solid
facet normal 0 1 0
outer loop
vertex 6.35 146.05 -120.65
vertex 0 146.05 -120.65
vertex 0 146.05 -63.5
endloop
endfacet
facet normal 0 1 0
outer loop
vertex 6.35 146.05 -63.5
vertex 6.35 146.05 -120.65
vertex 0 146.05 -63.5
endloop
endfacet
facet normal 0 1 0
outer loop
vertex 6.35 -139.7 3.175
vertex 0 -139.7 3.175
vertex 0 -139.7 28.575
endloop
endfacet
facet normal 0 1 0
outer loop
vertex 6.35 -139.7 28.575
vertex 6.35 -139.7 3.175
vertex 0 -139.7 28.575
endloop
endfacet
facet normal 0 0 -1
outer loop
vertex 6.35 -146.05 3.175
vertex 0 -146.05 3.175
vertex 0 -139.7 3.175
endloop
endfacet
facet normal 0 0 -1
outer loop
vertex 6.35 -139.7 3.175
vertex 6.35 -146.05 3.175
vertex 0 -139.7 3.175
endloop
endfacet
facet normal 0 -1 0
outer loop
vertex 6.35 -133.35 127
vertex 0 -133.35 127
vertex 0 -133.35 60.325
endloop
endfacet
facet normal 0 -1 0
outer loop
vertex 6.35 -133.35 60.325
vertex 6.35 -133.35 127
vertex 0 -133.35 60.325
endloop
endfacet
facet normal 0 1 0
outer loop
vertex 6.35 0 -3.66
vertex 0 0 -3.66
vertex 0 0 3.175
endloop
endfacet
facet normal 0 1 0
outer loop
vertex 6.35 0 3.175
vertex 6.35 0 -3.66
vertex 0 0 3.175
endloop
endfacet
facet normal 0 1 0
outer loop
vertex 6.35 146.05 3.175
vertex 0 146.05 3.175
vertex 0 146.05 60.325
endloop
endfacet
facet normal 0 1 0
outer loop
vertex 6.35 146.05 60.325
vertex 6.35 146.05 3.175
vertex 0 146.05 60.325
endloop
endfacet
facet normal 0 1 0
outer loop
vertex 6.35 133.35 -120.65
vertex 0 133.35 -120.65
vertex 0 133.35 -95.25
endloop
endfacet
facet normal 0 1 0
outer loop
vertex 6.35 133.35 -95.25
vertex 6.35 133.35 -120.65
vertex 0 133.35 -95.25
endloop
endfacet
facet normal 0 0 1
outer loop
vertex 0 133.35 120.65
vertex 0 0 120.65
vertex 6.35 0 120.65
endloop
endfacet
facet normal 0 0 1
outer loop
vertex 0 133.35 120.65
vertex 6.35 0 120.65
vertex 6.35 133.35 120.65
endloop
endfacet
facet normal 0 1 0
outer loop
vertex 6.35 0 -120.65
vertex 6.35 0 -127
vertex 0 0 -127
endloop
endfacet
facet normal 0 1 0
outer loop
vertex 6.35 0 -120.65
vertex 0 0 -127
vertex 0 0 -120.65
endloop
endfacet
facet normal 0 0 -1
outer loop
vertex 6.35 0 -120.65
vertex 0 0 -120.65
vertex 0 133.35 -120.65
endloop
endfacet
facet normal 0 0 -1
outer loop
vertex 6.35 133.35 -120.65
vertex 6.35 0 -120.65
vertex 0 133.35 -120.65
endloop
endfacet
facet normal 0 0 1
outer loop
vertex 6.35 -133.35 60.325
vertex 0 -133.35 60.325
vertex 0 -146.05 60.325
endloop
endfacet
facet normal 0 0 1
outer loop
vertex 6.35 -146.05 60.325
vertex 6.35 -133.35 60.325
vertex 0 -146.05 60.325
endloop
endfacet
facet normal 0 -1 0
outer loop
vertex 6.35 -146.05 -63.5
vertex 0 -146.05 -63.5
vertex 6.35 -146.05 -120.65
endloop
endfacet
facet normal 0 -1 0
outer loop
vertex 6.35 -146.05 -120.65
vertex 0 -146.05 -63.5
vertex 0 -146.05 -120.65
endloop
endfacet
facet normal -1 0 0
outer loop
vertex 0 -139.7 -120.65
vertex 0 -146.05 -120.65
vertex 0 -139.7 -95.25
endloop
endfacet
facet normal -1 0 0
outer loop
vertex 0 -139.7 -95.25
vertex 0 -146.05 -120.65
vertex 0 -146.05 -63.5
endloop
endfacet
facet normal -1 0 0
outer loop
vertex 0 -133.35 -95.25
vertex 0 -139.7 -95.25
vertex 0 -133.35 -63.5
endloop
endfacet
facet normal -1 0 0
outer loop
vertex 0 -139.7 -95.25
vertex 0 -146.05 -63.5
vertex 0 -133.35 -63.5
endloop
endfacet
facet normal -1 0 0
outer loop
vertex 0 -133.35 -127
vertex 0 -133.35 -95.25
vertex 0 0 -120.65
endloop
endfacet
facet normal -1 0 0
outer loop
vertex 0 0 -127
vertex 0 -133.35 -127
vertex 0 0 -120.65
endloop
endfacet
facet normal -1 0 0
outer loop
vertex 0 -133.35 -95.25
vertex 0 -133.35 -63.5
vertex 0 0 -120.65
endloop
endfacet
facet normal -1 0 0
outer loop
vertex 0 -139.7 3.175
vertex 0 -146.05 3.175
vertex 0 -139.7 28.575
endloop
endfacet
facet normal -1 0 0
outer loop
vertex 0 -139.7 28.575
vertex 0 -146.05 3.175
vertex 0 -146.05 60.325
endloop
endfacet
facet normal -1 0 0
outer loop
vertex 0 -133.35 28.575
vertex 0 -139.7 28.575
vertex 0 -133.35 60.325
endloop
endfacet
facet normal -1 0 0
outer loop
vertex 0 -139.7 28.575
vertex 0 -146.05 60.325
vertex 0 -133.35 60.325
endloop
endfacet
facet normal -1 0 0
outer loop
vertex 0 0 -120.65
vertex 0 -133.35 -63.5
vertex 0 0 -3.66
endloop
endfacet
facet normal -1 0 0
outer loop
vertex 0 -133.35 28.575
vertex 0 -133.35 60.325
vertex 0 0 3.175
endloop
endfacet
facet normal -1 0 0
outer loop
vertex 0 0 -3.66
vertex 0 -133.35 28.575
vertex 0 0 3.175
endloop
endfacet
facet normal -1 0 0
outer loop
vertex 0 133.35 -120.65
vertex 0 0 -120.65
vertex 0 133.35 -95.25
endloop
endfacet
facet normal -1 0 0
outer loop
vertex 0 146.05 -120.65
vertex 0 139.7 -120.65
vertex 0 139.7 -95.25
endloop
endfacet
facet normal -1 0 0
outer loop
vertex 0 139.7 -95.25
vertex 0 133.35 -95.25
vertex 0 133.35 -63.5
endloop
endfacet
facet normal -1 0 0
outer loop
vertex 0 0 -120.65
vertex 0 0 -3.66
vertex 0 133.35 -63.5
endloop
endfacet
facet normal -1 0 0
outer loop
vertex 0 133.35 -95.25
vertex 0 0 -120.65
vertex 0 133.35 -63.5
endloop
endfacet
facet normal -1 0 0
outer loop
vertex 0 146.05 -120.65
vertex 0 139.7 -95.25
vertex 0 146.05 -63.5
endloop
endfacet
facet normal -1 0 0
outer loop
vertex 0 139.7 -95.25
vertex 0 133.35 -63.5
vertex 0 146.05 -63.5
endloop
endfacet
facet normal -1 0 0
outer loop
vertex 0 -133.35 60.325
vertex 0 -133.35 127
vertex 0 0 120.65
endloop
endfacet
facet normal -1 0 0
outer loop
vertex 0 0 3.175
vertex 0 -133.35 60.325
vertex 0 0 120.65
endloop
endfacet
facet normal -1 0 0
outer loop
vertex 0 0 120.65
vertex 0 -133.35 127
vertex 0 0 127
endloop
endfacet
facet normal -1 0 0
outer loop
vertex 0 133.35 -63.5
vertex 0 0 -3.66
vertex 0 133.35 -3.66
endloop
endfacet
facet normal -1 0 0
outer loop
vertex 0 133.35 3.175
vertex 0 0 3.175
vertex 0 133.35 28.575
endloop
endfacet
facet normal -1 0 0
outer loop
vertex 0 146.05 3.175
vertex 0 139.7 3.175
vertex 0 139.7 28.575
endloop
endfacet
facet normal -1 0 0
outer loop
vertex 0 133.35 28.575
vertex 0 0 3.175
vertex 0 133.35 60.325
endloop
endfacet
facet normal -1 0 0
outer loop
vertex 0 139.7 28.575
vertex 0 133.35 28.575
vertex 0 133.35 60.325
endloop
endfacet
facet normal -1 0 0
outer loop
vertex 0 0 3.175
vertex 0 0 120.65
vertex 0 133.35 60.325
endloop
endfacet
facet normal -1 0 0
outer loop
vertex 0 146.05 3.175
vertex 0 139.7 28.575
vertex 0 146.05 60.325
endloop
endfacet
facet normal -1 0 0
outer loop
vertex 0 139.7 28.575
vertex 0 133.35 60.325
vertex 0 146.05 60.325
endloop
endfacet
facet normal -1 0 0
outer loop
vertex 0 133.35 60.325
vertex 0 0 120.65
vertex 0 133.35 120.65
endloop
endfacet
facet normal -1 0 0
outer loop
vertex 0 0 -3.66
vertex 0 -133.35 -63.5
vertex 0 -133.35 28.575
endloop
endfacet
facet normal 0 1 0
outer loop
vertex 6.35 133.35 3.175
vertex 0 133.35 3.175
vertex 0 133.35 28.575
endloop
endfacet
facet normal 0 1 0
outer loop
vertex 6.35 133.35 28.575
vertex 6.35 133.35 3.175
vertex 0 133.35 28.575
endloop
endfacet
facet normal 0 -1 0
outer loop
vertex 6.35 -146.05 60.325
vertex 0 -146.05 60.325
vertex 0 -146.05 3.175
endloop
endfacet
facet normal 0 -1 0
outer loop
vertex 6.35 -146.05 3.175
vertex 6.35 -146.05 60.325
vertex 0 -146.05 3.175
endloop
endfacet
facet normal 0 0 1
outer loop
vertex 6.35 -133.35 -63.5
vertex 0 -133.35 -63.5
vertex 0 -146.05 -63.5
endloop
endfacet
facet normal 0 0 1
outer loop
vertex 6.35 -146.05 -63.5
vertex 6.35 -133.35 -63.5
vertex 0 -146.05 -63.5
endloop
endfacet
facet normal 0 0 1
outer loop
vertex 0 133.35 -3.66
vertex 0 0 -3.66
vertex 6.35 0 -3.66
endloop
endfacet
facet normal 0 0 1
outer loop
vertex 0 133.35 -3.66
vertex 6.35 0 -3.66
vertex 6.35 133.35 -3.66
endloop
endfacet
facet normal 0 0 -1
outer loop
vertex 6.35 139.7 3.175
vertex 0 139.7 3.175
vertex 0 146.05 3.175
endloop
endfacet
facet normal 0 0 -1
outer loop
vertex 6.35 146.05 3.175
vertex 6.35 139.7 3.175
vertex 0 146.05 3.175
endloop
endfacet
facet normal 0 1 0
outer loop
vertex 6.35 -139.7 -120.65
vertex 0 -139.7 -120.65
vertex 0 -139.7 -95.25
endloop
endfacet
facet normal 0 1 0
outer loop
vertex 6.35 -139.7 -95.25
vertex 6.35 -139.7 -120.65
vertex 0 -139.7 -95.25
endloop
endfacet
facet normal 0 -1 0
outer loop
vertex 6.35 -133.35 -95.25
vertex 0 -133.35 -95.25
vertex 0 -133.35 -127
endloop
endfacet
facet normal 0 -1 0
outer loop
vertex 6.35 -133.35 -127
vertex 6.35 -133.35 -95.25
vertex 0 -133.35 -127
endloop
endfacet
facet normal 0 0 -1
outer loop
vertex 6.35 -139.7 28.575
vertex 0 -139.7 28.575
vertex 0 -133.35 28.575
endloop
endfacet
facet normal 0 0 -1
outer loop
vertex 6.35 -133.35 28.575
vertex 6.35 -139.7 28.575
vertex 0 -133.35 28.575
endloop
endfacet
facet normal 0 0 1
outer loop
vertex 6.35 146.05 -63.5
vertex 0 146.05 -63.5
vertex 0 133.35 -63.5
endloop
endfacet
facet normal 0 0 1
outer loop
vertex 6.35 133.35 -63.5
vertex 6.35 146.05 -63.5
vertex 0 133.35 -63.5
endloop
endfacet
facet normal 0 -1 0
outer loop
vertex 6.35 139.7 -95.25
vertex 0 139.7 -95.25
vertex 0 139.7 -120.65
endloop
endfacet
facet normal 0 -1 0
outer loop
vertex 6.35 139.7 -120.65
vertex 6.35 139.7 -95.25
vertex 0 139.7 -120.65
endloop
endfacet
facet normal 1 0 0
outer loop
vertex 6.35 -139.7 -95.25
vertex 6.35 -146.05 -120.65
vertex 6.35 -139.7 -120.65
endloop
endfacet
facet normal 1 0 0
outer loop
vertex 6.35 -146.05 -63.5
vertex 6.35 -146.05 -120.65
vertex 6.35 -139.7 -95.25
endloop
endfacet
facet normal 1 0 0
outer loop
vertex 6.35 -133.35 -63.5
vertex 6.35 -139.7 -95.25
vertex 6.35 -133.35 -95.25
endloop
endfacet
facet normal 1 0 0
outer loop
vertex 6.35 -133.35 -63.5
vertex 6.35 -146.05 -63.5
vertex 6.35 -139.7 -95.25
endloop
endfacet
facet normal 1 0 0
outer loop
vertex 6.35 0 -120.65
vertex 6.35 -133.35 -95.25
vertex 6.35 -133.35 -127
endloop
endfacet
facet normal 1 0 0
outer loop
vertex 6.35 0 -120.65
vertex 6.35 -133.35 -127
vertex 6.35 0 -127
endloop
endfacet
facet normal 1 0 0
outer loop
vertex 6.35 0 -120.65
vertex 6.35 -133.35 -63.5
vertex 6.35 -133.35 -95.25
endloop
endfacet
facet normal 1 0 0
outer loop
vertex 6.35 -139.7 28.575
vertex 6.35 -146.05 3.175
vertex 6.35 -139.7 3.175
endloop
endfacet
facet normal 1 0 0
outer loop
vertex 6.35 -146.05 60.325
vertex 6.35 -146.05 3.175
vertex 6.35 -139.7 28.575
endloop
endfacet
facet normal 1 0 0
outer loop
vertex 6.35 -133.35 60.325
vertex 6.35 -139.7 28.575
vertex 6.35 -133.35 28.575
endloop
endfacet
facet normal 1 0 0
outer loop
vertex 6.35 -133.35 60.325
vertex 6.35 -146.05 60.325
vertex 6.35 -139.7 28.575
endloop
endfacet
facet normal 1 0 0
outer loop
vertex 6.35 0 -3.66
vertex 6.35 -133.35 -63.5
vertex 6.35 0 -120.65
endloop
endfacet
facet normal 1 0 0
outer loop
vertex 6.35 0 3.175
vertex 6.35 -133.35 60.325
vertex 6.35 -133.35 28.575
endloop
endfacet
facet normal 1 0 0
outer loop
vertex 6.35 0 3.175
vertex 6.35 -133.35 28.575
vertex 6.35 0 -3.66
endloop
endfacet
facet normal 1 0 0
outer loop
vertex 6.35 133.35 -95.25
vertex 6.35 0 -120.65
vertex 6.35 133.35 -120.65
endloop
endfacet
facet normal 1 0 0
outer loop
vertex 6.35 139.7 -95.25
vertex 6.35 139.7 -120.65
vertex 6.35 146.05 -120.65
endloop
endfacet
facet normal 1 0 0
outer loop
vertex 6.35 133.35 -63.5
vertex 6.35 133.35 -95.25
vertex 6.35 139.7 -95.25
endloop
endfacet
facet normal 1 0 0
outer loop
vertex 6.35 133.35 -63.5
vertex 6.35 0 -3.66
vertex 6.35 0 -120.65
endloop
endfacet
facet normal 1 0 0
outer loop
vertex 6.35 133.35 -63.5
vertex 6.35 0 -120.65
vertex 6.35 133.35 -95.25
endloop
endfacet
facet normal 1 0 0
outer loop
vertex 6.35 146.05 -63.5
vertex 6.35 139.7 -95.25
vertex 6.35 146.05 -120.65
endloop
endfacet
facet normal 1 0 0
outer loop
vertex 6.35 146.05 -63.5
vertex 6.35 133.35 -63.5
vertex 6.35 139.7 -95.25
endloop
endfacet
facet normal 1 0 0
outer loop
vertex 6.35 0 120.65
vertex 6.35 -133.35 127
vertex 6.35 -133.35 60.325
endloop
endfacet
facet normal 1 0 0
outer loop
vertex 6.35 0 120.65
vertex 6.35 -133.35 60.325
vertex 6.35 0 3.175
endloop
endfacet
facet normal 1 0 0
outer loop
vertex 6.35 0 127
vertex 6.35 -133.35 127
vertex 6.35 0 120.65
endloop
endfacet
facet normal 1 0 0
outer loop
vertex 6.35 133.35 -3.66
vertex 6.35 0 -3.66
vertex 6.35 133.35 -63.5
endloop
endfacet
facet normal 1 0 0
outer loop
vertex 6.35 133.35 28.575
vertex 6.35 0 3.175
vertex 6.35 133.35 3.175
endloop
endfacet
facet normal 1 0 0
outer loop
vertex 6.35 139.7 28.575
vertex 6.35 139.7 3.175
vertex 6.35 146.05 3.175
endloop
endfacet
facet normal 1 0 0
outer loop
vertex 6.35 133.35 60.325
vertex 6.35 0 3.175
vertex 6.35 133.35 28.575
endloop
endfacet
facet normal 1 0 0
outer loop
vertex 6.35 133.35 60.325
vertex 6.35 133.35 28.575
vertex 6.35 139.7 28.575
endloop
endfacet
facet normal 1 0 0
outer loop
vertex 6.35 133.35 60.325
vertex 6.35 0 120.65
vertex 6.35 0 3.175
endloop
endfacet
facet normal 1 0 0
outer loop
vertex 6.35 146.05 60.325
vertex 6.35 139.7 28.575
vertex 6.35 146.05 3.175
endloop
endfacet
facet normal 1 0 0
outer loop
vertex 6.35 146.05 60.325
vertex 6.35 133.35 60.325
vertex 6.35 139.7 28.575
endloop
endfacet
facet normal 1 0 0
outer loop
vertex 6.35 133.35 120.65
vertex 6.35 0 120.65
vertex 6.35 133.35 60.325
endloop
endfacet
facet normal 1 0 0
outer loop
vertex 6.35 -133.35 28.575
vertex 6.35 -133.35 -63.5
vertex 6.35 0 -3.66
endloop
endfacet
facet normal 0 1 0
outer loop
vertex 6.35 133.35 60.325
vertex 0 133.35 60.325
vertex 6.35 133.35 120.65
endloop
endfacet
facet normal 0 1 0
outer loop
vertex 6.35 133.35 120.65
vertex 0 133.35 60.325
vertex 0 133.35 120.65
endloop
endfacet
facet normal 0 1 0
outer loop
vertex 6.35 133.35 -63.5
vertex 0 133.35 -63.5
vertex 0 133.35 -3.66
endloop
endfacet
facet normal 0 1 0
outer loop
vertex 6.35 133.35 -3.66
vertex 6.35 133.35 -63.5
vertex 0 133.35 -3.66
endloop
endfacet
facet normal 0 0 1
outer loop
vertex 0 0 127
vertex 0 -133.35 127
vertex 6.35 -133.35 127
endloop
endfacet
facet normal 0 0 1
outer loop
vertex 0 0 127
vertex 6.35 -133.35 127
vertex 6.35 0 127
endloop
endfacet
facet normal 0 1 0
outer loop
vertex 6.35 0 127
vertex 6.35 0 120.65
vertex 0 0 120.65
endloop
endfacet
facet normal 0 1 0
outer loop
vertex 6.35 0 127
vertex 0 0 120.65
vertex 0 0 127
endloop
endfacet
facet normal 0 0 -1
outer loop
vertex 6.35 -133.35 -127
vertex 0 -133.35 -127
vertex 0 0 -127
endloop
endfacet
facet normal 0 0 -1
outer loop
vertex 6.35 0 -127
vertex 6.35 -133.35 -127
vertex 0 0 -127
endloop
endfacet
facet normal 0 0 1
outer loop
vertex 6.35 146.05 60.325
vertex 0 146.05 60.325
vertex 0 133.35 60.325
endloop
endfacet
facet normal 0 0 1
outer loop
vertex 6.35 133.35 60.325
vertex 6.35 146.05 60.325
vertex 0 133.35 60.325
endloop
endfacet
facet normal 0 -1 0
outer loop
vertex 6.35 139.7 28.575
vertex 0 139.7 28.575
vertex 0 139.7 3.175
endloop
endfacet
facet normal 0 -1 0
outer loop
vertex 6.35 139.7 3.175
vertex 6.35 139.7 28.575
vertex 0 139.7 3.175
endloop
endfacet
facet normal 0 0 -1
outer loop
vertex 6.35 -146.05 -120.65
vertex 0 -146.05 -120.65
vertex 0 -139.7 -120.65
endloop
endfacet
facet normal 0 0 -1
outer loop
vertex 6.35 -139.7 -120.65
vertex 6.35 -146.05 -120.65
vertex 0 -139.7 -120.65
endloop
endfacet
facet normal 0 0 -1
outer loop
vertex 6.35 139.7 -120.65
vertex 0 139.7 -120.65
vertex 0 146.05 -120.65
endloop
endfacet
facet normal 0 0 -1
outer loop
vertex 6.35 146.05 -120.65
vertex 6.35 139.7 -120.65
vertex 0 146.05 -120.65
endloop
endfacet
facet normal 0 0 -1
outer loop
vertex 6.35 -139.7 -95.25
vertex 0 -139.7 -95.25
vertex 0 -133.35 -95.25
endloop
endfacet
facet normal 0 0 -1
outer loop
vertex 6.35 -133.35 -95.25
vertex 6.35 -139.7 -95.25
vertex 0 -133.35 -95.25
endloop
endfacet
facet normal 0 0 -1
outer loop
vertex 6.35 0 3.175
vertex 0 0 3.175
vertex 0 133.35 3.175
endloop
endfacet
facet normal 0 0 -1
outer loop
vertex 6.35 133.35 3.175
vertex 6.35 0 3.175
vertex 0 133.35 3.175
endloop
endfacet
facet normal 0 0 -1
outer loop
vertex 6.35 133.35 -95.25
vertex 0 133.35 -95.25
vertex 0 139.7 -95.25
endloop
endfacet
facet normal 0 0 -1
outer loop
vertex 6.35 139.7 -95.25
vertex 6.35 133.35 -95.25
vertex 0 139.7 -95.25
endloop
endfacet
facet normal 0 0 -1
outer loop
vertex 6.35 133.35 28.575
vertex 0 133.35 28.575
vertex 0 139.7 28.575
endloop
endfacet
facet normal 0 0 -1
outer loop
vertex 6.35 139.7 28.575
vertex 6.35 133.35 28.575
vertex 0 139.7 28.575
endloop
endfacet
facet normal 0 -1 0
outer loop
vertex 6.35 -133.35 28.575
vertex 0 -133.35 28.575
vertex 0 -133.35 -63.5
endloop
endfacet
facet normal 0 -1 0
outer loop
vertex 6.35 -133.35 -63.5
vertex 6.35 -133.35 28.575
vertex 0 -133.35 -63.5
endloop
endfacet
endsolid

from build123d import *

# Parameters (mm, degrees)
F0_W     = 133.35
F0_H     = 6.35
F0_H_2   = 60.325
F0_H_3   = 31.75
F0_W_2   = 6.35
F0_H_4   = 25.4
F0_H_5   = 6.8349212326
F0_H_6   = 59.8400787674
F1_DEPTH = 6.35


# Not quite as in the source:
# - a feature names something its author has since deleted; it is built from what else it names


with BuildPart() as f1:
    # F0 (on Right) → F1 (new body)
    with BuildSketch(Plane.YZ):
        with Locations((-66.675, 123.825)):
            Rectangle(F0_W, F0_H)
        with Locations((-66.675, 90.4875)):
            Rectangle(F0_W, F0_H_2)
        with Locations((66.675, 90.4875)):
            Rectangle(F0_W, F0_H_2)
        with Locations((-66.675, 44.45)):
            Rectangle(F0_W, F0_H_3)
        with Locations((-136.525, 44.45)):
            Rectangle(F0_W_2, F0_H_3)
        with Locations((66.675, 44.45)):
            Rectangle(F0_W, F0_H_3)
        with Locations((-66.675, 15.875)):
            Rectangle(F0_W, F0_H_4)
        with Locations((-142.875, 44.45)):
            Rectangle(F0_W_2, F0_H_3)
        with Locations((136.525, 44.45)):
            Rectangle(F0_W_2, F0_H_3)
        with Locations((66.675, 15.875)):
            Rectangle(F0_W, F0_H_4)
        with Locations((-66.675, -0.2424606163)):
            Rectangle(F0_W, F0_H_5)
        with Locations((-142.875, 15.875)):
            Rectangle(F0_W_2, F0_H_4)
        Polygon((146.05, 60.325), (139.7, 60.325), (139.7, 28.575), (139.7, 3.175), (146.05, 3.175), align=None)
        with Locations((-66.675, -33.5799606163)):
            Rectangle(F0_W, F0_H_6)
        with Locations((66.675, -33.5799606163)):
            Rectangle(F0_W, F0_H_6)
        with Locations((-66.675, -79.375)):
            Rectangle(F0_W, F0_H_3)
        with Locations((-136.525, -79.375)):
            Rectangle(F0_W_2, F0_H_3)
        with Locations((66.675, -79.375)):
            Rectangle(F0_W, F0_H_3)
        with Locations((-66.675, -107.95)):
            Rectangle(F0_W, F0_H_4)
        with Locations((-142.875, -79.375)):
            Rectangle(F0_W_2, F0_H_3)
        with Locations((136.525, -79.375)):
            Rectangle(F0_W_2, F0_H_3)
        with Locations((66.675, -107.95)):
            Rectangle(F0_W, F0_H_4)
        with Locations((-66.675, -123.825)):
            Rectangle(F0_W, F0_H)
        with Locations((-142.875, -107.95)):
            Rectangle(F0_W_2, F0_H_4)
        Polygon((146.05, -63.5), (139.7, -63.5), (139.7, -95.25), (139.7, -120.65), (146.05, -120.65), align=None)
    extrude(amount=F1_DEPTH)


solid = f1.part
